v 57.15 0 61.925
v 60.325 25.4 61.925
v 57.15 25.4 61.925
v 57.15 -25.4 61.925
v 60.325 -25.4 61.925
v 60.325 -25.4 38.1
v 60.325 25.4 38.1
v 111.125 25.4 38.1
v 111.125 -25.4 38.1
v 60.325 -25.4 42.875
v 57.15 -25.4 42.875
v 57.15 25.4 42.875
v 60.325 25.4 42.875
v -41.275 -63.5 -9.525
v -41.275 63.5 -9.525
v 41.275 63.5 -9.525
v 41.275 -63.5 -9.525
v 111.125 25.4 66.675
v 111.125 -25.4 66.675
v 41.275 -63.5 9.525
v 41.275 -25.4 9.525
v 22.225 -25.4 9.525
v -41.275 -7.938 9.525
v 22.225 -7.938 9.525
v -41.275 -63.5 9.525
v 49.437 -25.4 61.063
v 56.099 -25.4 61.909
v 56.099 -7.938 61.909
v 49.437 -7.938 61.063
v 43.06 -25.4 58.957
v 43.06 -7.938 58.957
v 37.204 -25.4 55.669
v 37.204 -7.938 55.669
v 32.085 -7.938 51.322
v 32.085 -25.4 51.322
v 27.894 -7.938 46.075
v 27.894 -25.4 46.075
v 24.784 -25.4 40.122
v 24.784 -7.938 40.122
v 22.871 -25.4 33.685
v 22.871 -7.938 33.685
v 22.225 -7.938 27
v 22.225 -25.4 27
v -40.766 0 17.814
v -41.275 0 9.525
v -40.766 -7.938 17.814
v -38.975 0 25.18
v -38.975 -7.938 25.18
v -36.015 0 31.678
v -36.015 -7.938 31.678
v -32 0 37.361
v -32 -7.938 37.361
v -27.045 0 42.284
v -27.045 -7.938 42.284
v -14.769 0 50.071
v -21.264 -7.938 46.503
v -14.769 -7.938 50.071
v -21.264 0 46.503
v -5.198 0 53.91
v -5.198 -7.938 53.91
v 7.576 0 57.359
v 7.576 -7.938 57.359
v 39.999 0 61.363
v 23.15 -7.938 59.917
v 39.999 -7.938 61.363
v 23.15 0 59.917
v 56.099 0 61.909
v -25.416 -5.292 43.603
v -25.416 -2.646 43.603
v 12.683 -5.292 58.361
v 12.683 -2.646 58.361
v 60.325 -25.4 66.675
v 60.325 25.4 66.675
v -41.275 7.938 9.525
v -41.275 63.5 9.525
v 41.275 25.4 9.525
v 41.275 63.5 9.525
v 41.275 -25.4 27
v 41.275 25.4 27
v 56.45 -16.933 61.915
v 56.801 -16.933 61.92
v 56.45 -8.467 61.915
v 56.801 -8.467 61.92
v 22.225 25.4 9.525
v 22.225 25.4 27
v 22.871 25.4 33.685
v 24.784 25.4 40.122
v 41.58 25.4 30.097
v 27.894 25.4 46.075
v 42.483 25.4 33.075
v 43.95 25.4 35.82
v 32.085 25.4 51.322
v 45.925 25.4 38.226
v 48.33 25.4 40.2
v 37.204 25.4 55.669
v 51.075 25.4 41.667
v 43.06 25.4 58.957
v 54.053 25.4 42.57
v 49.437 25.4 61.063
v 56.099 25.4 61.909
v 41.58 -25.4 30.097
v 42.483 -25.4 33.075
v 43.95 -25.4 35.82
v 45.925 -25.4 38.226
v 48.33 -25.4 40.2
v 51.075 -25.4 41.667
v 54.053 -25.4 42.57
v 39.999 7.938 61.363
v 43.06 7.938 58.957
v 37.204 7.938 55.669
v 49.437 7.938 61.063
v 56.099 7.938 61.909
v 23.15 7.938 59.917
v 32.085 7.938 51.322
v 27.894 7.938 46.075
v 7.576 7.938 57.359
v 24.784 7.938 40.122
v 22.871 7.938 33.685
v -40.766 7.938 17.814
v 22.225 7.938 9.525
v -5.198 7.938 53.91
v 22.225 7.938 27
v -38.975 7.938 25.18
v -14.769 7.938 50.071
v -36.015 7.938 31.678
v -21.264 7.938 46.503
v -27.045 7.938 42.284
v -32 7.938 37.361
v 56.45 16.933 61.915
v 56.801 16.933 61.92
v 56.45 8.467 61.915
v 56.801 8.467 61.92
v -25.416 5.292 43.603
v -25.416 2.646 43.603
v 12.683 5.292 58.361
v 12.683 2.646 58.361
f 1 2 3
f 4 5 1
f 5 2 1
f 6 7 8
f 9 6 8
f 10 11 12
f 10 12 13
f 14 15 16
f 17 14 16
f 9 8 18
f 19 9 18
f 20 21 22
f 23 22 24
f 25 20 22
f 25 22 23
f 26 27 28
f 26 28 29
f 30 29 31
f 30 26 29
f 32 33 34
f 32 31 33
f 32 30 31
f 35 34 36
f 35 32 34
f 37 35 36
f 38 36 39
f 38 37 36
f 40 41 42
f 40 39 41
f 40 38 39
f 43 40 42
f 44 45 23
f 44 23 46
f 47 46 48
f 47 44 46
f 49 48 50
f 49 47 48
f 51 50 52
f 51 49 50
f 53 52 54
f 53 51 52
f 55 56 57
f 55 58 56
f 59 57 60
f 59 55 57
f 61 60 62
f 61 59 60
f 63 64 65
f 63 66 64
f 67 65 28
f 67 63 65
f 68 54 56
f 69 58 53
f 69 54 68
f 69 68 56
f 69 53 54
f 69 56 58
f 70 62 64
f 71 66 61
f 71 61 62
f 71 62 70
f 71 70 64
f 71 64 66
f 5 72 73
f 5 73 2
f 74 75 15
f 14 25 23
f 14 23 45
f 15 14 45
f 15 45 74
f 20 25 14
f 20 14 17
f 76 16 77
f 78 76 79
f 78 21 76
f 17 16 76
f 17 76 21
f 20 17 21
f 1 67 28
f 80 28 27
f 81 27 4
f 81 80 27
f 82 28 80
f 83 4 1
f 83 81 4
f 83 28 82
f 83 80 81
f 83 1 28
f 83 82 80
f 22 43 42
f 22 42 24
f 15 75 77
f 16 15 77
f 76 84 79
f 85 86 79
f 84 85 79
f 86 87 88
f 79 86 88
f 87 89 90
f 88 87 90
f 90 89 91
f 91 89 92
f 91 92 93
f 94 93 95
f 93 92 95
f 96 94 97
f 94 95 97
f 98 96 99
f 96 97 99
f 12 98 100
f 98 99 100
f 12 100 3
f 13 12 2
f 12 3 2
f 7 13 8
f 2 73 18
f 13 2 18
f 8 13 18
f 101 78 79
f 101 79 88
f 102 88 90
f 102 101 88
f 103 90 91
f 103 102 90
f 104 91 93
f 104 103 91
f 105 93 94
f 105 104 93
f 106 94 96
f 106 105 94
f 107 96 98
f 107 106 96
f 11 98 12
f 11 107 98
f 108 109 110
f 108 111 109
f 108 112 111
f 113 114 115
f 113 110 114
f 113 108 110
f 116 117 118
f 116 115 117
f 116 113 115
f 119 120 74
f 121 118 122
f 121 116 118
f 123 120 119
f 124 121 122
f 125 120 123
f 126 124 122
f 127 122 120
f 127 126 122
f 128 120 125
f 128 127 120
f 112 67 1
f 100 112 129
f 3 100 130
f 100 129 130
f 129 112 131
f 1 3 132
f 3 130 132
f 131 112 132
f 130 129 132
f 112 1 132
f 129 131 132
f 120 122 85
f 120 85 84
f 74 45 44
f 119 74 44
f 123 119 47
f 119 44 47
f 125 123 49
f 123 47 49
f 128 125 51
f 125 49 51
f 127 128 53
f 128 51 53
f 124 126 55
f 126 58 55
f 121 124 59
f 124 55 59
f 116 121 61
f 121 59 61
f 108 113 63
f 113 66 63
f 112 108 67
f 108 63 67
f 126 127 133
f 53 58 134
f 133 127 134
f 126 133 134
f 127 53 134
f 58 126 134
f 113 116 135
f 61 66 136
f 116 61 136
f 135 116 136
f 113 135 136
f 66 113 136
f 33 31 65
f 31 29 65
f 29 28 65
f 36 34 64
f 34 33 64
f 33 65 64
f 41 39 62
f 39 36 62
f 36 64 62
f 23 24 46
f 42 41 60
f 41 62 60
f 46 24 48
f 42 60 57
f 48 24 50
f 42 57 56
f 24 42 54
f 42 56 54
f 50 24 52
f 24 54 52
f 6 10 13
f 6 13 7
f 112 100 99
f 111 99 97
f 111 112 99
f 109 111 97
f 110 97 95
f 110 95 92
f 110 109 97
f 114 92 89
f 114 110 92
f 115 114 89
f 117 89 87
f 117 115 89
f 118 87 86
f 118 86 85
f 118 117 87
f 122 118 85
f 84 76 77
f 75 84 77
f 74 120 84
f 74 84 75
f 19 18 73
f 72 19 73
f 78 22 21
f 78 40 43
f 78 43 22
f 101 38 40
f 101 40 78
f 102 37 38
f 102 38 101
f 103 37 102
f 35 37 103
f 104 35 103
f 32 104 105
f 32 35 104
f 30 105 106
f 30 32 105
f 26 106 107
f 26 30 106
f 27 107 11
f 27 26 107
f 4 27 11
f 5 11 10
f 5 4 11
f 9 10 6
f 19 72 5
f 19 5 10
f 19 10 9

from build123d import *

# Parameters (mm, degrees)
F1_DEPTH = 63.5
F2_DEPTH = 25.4
F3_DEPTH = 7.9375


with BuildPart() as f1:
    # F0 (on Front) → F1 (new body, symmetric)
    with BuildSketch(Plane.XZ):
        Polygon((-41.275, 9.525), (-41.275, -9.525), (41.275, -9.525), (41.275, 9.525), (22.225, 9.525), align=None)
    extrude(amount=F1_DEPTH, both=True)

    # F0 (on Front) → F2 (join, symmetric)
    with BuildSketch(Plane.XZ):
        with BuildLine():
            Line((22.225, 9.525), (41.275, 9.525))
            Line((41.275, 9.525), (41.275, 27.0002))
            ThreePointArc((41.275, 27.0002), (45.92468, 38.22552), (57.15, 42.8752))
            Line((57.15, 42.8752), (60.325, 42.8752))
            Line((60.325, 42.8752), (60.325, 61.9252))
            Line((60.325, 61.9252), (57.15, 61.9252))
            add(Edge.make_bspline(
                [(56.099081, 61.909385), (56.450721, 61.915), (56.801044, 61.920264), (57.15, 61.9252)],
                knots=[110.543175, 110.543175, 110.543175, 110.543175, 111.504536, 111.504536, 111.504536, 111.504536], degree=3))
            ThreePointArc((56.099081, 61.909385), (32.085494, 51.321511), (22.225, 27.0002))
            Line((22.225, 27.0002), (22.225, 9.525))
        make_face()
        Polygon((111.125, 66.675), (88.400421, 66.675), (88.923447, 38.1), (111.125, 38.1), align=None)
        Polygon((60.325, 66.675), (60.325, 61.9252), (60.325, 42.8752), (60.325, 38.1), (88.923447, 38.1), (88.400421, 66.675), align=None)
    extrude(amount=F2_DEPTH, both=True)

    # F0 (on Front) → F3 (join, symmetric)
    with BuildSketch(Plane.XZ):
        with BuildLine():
            add(Edge.make_bspline(
                [(-41.275, 9.525), (-42.176598, 55.966002), (15.665411, 61.263678), (56.099081, 61.909385)],
                knots=[0, 0, 0, 0, 110.543175, 110.543175, 110.543175, 110.543175], degree=3))
            Line((-41.275, 9.525), (22.225, 9.525))
            Line((22.225, 9.525), (22.225, 27.0002))
            ThreePointArc((22.225, 27.0002), (32.085494, 51.321511), (56.099081, 61.909385))
        make_face()
    extrude(amount=F3_DEPTH, both=True)


solid = f1.part
